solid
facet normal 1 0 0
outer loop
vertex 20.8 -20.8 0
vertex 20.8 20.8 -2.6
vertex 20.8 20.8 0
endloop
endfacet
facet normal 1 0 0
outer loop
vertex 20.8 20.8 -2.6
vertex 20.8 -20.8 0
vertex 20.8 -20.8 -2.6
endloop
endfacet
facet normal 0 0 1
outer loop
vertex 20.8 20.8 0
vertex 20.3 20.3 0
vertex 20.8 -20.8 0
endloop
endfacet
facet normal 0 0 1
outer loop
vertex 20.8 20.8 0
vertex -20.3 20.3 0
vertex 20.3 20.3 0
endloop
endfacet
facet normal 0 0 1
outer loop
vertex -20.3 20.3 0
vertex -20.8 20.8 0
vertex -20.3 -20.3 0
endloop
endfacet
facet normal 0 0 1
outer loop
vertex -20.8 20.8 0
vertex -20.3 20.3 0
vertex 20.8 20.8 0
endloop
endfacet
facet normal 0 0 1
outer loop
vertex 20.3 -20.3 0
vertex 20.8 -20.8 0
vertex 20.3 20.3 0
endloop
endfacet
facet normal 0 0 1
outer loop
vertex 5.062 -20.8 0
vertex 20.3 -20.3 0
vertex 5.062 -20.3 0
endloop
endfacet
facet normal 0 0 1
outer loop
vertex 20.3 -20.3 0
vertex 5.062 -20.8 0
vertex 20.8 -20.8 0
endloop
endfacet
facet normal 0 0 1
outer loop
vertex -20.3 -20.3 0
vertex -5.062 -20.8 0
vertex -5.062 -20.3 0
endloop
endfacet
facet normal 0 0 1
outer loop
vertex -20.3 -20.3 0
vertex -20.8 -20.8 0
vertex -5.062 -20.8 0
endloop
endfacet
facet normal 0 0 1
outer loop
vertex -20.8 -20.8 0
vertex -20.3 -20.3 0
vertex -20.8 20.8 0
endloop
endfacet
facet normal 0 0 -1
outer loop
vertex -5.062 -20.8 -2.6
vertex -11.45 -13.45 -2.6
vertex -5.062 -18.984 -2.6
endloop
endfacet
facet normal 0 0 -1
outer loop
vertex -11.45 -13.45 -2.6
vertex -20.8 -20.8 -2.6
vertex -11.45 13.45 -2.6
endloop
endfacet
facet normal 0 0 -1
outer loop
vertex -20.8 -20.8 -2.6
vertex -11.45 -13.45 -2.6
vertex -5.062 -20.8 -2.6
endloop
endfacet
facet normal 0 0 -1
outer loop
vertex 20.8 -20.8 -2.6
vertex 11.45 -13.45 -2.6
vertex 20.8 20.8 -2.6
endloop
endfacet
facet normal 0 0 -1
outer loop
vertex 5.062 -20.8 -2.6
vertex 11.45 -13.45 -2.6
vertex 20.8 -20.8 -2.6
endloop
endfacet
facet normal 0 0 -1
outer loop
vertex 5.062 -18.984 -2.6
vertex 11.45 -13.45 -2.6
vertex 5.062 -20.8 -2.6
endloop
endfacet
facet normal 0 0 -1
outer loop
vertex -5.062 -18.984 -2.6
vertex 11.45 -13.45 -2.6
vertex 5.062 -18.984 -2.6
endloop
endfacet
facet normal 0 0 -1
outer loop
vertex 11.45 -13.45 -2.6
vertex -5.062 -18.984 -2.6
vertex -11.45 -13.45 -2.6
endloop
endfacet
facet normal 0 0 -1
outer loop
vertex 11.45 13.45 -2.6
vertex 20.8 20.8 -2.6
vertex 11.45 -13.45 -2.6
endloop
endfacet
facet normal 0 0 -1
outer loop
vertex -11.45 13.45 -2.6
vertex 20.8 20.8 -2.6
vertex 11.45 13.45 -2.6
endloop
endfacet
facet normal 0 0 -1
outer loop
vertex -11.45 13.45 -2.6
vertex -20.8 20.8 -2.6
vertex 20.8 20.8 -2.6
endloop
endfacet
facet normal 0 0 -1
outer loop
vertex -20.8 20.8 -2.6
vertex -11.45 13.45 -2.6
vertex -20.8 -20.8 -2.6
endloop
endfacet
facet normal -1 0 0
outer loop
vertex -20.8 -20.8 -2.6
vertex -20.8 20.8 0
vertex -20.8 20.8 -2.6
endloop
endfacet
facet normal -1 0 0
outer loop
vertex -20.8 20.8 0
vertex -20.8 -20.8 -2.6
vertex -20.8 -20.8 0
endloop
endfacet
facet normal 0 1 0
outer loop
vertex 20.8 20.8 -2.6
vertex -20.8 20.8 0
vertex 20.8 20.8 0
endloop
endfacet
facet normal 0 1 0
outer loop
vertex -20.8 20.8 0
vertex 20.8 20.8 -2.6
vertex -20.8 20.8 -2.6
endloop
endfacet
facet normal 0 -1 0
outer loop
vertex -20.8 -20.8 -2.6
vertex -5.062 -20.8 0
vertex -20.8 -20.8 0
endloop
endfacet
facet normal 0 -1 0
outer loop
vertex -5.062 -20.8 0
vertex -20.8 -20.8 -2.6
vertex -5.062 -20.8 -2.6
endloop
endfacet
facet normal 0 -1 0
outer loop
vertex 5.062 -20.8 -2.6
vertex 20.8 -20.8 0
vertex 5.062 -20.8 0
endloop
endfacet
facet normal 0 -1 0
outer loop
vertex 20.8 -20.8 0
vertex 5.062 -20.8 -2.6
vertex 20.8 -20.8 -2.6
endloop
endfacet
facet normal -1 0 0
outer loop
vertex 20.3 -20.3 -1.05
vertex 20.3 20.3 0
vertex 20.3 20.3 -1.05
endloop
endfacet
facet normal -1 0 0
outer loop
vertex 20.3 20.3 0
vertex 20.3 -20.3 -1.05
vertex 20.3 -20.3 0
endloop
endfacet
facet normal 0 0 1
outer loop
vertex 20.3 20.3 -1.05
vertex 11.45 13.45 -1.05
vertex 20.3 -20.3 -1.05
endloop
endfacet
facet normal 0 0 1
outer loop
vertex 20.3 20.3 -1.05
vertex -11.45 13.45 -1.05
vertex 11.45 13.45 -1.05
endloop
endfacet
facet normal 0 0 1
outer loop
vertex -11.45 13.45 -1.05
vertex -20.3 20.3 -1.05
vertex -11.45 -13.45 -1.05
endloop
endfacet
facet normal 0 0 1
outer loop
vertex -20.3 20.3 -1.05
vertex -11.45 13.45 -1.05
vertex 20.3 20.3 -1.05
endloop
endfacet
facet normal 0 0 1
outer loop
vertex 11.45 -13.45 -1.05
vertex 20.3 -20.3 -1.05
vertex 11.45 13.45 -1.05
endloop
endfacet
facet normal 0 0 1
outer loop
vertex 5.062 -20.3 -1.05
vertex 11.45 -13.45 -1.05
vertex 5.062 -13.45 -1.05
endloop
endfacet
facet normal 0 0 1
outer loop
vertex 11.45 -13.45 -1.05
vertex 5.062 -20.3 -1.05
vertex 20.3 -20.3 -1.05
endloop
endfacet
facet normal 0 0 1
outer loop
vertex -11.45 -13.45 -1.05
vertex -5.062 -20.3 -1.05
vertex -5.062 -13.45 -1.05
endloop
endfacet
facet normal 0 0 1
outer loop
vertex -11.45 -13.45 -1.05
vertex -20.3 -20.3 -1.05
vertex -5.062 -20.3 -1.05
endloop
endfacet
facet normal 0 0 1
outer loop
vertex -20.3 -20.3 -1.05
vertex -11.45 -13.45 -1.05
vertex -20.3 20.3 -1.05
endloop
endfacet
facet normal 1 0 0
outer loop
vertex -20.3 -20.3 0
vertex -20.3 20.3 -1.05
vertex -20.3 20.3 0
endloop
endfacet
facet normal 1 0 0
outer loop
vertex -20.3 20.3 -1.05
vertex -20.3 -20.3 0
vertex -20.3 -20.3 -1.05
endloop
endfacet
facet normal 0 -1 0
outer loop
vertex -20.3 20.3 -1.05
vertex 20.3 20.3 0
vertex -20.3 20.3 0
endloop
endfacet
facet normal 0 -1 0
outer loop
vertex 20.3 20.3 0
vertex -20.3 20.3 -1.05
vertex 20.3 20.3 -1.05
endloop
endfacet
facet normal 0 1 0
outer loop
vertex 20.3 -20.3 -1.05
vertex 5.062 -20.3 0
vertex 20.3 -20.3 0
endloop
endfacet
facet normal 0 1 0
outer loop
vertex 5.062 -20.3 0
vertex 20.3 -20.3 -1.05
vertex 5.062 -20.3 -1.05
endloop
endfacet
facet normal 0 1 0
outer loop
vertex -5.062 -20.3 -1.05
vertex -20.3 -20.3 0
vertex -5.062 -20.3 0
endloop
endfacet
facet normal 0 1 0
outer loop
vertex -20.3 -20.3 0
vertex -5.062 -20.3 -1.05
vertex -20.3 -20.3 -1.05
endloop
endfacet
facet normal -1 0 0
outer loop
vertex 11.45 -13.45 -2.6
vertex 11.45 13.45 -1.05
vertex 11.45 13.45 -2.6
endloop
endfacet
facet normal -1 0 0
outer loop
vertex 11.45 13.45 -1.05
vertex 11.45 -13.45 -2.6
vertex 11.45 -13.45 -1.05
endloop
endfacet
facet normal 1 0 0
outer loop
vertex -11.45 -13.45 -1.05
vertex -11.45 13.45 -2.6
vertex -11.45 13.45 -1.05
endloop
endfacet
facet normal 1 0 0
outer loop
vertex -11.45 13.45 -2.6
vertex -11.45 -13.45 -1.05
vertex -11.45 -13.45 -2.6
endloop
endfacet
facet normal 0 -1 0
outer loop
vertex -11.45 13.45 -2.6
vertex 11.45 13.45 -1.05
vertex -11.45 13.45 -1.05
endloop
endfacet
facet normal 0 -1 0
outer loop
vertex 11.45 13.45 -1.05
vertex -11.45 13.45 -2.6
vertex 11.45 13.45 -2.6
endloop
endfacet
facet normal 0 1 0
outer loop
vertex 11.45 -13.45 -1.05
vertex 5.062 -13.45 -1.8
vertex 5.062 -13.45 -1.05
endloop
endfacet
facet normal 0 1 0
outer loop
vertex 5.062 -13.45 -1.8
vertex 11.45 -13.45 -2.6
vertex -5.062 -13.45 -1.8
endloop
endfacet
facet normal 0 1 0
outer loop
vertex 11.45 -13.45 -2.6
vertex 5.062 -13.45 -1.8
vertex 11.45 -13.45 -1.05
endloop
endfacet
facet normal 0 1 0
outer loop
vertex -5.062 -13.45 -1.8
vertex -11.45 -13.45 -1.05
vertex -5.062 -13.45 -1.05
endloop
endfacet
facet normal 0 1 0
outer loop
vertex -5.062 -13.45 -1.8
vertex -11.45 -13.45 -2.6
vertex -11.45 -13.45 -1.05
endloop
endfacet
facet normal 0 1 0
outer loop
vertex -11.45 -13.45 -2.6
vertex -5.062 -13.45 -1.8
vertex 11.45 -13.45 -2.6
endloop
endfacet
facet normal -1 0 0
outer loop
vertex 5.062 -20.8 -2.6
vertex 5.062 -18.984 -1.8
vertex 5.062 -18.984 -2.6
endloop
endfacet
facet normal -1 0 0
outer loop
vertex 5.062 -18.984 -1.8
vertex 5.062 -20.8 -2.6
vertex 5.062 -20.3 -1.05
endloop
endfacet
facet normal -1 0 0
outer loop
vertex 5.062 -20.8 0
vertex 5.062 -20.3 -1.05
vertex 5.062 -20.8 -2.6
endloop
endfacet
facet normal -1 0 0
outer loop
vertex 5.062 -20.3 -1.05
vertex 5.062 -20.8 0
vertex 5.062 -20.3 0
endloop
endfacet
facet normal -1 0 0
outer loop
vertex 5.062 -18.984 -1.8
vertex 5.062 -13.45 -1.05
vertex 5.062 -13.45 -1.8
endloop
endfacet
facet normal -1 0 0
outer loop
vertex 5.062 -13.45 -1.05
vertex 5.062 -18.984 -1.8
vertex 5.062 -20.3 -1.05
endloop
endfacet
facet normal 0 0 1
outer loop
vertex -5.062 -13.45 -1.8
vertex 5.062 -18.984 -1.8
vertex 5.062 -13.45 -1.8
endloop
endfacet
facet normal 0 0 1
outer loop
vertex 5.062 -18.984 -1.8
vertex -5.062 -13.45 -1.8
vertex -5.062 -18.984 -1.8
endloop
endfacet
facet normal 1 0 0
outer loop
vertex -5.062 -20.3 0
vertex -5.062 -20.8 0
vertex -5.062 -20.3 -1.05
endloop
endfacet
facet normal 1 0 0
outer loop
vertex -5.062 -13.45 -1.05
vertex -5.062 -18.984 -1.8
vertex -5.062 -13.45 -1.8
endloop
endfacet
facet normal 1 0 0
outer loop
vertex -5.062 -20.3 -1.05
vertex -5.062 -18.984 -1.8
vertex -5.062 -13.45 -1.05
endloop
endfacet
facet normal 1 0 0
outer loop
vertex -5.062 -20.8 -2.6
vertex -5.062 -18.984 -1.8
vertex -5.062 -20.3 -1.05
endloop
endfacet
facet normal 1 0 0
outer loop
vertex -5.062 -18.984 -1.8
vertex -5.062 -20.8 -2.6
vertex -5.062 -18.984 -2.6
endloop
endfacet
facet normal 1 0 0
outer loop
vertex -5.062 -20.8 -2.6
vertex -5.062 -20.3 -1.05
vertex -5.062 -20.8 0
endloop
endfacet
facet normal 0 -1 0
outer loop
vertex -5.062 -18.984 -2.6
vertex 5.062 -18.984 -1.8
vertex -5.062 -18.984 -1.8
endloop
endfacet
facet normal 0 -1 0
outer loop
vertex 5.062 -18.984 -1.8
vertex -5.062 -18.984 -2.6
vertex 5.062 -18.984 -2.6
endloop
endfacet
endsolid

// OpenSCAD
errorValue = 0.1;
boardX = 22.8;
boardY = 26.8;
boardThinkness = 1.6;
steelMeshX = 40.5;
steelMeshY = 40.5;
wall = 1.0;
boardOffsetX = 0.0;
boardOffsetY = 0.0;

difference() {
    translate([0,0,-(boardThinkness+wall)/2]) cube([steelMeshX + errorValue + wall, steelMeshY + errorValue + wall, boardThinkness + wall], true);
    translate([0,0, -errorValue/2]) translate([0,0,boardThinkness / 2 - wall/2 + errorValue / 2]) cube([steelMeshX + errorValue, steelMeshY + errorValue, (boardThinkness + wall + errorValue)], true);
    translate([boardOffsetX, boardOffsetY, 0]) cube([boardX+errorValue, boardY+errorValue,(boardThinkness + wall) * 4], true);
    translate([0,-steelMeshY/2,0]) cube([steelMeshX / 4, steelMeshY, wall * 2 + boardThinkness], true);
    translate([0,-steelMeshY/2,0]) cube([steelMeshX / 4, steelMeshY/16, (wall + boardThinkness) * 4], true);
}
